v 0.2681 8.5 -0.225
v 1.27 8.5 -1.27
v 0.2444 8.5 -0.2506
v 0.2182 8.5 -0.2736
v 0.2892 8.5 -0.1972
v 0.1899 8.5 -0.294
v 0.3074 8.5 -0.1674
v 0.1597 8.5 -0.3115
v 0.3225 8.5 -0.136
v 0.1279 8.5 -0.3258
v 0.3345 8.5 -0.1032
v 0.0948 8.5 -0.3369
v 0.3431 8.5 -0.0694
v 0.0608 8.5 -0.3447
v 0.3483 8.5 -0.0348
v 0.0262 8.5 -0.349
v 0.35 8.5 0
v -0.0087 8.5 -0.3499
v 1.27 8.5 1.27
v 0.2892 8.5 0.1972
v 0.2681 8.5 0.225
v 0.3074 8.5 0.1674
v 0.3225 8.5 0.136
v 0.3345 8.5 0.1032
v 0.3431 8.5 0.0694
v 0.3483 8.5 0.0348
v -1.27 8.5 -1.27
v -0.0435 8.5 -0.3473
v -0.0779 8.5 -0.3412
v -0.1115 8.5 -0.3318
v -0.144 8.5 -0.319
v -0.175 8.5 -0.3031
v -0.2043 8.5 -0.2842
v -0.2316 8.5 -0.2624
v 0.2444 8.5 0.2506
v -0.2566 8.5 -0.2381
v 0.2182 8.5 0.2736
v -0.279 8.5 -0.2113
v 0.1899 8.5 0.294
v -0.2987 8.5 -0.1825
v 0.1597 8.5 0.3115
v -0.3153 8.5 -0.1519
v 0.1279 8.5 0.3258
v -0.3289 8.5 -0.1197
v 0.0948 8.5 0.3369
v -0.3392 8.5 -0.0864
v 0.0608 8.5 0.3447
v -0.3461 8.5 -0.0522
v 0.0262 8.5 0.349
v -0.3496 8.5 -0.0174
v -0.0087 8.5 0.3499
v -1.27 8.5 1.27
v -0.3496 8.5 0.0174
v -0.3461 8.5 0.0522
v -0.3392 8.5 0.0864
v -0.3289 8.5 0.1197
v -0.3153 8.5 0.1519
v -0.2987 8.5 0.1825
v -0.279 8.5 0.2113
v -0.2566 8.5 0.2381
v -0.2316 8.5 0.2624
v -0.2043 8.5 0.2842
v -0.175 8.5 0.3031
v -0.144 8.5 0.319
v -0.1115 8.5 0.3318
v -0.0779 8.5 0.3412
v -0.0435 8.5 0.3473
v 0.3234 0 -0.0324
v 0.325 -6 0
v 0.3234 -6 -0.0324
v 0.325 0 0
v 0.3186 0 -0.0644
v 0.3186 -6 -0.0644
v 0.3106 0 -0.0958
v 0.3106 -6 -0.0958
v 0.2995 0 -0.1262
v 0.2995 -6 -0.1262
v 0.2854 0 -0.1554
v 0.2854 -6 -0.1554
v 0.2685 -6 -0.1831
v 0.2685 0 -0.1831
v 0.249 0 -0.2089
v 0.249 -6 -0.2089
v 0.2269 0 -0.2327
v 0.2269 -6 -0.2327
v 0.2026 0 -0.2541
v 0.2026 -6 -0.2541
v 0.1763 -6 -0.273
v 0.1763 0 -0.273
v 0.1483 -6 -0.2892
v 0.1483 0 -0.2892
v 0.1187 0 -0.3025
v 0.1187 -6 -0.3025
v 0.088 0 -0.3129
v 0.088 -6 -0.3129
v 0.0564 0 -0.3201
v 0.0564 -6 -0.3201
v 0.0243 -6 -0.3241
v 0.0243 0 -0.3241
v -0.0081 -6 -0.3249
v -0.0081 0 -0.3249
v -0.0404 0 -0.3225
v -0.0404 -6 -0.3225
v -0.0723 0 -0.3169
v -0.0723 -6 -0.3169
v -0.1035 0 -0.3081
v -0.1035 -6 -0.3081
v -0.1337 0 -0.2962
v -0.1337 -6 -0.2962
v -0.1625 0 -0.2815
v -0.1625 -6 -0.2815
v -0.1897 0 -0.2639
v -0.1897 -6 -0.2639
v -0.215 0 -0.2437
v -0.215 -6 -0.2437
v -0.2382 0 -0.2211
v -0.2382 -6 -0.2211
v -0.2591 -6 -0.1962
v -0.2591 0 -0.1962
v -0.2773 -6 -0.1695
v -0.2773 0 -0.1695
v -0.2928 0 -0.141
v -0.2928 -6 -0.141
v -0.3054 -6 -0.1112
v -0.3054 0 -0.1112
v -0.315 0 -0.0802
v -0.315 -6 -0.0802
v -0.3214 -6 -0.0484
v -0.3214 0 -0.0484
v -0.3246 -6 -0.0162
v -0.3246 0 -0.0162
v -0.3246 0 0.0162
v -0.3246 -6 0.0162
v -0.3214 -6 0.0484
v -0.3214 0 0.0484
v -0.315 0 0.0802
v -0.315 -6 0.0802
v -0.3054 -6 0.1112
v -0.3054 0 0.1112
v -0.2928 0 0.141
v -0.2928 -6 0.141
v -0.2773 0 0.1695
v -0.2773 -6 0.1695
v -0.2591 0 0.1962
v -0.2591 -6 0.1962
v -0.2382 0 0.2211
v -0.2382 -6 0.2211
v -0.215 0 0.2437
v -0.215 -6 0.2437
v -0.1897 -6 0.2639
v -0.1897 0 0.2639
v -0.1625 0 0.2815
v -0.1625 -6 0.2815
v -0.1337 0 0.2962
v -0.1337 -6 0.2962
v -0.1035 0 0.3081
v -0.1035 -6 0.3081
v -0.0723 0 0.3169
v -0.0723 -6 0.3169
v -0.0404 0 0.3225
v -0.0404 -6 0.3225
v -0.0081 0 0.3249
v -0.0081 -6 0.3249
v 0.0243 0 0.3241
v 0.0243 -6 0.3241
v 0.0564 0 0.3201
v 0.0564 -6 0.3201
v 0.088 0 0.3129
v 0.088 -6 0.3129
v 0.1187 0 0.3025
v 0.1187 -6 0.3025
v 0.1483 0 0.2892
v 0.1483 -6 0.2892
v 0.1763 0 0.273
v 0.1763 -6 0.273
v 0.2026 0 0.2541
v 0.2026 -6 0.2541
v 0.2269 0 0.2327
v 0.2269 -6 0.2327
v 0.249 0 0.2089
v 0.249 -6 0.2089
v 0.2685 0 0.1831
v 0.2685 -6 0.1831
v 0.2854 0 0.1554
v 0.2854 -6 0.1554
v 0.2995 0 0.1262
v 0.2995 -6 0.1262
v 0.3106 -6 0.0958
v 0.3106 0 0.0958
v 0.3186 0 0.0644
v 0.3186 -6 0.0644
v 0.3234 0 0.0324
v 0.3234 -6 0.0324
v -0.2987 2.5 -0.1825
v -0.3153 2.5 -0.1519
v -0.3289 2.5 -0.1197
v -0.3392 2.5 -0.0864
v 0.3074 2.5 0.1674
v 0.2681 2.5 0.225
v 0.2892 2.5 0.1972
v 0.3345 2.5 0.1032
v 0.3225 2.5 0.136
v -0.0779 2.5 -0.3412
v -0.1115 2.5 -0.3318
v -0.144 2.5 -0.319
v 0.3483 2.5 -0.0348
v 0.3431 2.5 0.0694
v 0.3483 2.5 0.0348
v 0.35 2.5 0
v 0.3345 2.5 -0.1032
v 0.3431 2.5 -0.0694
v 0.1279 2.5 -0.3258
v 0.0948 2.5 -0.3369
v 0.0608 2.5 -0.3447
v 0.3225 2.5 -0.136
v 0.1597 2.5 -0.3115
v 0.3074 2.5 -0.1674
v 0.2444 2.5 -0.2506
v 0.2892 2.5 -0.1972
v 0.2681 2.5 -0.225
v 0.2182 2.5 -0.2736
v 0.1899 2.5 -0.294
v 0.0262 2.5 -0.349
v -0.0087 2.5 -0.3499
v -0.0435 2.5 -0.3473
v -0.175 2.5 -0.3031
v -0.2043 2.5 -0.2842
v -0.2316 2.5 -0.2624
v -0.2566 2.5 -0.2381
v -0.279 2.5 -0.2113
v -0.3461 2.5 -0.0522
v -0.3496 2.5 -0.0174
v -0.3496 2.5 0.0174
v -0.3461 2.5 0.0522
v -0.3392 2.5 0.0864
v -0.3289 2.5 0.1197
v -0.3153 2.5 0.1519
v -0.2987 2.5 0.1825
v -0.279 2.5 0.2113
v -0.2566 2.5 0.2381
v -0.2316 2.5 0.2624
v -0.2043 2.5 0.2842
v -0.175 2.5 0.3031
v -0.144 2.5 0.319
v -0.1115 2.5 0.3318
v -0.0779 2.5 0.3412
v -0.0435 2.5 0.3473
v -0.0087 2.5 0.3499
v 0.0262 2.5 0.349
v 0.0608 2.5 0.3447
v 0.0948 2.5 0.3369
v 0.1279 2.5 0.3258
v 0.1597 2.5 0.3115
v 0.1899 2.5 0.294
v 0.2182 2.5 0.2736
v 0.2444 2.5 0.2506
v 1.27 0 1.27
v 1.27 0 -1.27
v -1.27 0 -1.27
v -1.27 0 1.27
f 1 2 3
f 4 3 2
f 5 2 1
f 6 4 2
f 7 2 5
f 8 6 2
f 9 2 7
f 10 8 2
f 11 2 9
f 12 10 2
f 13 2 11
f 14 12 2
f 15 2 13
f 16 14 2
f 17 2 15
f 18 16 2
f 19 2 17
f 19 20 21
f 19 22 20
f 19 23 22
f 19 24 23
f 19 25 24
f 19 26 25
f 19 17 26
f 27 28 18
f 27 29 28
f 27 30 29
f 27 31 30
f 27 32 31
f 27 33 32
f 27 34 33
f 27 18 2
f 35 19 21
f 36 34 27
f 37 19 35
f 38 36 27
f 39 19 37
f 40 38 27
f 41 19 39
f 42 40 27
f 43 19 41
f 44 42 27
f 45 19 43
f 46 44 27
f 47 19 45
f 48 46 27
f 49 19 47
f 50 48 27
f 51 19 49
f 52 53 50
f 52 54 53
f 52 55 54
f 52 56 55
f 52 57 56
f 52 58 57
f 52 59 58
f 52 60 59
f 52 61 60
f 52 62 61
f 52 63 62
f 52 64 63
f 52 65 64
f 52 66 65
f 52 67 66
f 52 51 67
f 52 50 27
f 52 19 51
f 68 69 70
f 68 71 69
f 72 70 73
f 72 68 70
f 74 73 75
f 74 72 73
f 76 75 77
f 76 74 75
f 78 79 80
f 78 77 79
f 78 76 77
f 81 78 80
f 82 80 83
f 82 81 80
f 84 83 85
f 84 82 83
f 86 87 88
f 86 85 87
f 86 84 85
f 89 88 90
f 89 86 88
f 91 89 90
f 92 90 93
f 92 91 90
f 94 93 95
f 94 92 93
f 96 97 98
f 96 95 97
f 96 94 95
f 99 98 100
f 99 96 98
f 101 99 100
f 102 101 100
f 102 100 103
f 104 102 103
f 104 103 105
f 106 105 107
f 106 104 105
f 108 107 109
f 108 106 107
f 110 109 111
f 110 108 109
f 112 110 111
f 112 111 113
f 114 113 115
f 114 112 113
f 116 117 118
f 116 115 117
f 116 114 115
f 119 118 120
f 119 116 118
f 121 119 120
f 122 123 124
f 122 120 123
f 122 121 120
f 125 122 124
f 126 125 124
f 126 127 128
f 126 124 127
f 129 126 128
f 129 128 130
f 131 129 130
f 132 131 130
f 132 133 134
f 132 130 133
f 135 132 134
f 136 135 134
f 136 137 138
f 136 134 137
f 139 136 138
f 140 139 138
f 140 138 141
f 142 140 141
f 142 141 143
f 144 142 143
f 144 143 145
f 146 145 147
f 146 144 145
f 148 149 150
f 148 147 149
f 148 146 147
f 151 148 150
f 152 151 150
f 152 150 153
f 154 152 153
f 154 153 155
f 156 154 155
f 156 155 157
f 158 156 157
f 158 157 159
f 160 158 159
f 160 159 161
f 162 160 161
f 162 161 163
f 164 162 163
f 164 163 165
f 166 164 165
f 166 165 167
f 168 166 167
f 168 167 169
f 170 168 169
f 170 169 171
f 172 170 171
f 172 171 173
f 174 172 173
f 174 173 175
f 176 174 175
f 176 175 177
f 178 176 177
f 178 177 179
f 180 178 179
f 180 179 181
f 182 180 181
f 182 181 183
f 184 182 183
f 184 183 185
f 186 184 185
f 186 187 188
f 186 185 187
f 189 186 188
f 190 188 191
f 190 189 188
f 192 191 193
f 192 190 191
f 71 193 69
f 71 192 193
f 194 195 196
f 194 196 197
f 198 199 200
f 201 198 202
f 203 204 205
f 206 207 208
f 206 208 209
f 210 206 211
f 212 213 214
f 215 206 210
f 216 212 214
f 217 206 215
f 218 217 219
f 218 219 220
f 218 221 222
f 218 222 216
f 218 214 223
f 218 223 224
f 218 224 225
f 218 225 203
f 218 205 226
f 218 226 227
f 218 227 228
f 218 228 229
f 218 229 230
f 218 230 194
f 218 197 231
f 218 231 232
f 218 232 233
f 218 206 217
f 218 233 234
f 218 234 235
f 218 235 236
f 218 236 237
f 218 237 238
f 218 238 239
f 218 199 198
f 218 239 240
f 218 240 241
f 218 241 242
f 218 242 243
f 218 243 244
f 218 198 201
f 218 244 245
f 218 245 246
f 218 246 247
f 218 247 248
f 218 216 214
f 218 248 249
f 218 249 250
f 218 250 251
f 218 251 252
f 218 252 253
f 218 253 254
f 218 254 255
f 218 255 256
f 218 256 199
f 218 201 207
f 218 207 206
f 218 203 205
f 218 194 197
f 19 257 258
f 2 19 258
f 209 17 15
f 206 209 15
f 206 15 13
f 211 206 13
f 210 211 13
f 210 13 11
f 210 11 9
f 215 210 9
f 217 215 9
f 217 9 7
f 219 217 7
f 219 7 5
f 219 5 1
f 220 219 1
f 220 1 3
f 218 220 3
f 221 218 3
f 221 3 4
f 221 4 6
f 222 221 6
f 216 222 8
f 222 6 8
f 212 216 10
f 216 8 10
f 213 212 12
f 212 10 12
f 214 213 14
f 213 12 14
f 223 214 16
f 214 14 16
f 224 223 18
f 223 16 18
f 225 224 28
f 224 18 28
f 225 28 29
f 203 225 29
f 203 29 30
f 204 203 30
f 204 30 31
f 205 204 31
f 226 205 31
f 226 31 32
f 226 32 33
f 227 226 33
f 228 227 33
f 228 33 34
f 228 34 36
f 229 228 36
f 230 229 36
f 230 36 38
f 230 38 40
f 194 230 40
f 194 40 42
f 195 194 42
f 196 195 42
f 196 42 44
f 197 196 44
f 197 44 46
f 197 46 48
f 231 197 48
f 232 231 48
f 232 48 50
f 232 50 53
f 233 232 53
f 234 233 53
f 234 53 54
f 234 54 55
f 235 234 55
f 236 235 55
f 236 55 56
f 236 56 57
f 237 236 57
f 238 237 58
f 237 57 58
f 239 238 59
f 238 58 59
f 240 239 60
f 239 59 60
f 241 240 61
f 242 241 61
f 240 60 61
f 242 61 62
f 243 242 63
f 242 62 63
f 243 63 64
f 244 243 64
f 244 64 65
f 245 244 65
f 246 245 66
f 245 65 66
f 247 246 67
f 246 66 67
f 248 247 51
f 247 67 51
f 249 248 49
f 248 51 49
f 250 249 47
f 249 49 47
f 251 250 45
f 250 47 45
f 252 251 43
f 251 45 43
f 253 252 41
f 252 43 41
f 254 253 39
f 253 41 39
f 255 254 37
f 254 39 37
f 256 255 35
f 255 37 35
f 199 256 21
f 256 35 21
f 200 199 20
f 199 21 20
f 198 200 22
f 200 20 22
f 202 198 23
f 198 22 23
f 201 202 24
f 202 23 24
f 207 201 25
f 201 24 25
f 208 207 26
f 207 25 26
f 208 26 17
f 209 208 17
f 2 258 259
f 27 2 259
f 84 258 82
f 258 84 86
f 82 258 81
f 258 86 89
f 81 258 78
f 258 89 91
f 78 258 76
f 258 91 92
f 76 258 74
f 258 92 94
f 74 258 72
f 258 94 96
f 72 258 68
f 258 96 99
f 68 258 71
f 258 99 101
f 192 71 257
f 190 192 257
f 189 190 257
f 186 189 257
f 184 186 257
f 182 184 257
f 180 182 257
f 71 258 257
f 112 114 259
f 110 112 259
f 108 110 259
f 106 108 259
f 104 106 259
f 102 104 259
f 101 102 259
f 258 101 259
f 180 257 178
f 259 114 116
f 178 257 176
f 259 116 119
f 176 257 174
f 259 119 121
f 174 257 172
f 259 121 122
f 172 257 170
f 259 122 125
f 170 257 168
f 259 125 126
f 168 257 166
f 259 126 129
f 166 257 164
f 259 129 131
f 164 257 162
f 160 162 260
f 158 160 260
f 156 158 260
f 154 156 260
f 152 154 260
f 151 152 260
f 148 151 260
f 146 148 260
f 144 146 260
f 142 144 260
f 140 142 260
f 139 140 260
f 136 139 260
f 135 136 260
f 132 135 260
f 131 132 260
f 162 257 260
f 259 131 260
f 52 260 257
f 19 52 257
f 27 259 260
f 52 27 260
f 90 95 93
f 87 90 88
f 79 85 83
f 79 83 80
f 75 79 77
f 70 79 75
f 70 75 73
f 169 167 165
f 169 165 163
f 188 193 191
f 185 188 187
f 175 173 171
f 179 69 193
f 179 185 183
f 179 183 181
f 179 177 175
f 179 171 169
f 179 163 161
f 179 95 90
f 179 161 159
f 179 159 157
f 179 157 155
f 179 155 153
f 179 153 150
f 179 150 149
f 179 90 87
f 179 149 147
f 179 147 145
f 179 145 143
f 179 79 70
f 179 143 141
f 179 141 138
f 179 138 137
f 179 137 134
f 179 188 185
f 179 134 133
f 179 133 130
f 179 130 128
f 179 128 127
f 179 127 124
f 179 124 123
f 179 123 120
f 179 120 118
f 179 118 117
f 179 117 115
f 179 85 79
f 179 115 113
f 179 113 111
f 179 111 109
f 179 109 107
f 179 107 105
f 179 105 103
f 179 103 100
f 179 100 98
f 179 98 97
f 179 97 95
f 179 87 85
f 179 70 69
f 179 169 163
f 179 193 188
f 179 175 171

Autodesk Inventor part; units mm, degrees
ref_plane "YZ Plane" through (0, 0, 0) normal (1, 0, 0) x (0, 1, 0)
ref_plane "XZ Plane" through (0, 0, 0) normal (0, 1, 0) x (-1, 0, 0)
ref_plane "XY Plane" through (0, 0, 0) normal (0, 0, 1) x (1, 0, 0)
sketch "Sketch1" plane through (0, 0, 0) normal (0, 1, 0) x (-1, 0, 0)
  line L0 (-1.27, -1.27) -> (1.27, -1.27)
  line L1 (1.27, -1.27) -> (1.27, 1.27)
  line L2 (1.27, 1.27) -> (-1.27, 1.27)
  line L3 (-1.27, 1.27) -> (-1.27, -1.27)
  line L4 (-1.27, -1.27) -> (1.27, 1.27) construction
  line L5 (1.27, -1.27) -> (-1.27, 1.27) construction
  point P0 (0, 0)
  dimension "d0" = 2.54
  dimension "d1" = 2.54
extrude "Extrusion1" add sketch "Sketch1" along normal blind 8.5
sketch "Sketch2" plane through (0, 8.5, 0) normal (0, 1, 0) x (1, 0, 0)
  circle A0 centre (0, 0) radius 0.35
  dimension "d4" = 0.7
extrude "Extrusion2" cut sketch "Sketch2" against normal blind 6
sketch "Sketch3" plane through (0, 0, 0) normal (0, -1, 0) x (1, 0, 0)
  circle A0 centre (0, 0) radius 0.325
  dimension "d7" = 0.65
extrude "Extrusion3" add sketch "Sketch3" along normal blind 6
properties part number "pin-header-female" material "Aluminum"
